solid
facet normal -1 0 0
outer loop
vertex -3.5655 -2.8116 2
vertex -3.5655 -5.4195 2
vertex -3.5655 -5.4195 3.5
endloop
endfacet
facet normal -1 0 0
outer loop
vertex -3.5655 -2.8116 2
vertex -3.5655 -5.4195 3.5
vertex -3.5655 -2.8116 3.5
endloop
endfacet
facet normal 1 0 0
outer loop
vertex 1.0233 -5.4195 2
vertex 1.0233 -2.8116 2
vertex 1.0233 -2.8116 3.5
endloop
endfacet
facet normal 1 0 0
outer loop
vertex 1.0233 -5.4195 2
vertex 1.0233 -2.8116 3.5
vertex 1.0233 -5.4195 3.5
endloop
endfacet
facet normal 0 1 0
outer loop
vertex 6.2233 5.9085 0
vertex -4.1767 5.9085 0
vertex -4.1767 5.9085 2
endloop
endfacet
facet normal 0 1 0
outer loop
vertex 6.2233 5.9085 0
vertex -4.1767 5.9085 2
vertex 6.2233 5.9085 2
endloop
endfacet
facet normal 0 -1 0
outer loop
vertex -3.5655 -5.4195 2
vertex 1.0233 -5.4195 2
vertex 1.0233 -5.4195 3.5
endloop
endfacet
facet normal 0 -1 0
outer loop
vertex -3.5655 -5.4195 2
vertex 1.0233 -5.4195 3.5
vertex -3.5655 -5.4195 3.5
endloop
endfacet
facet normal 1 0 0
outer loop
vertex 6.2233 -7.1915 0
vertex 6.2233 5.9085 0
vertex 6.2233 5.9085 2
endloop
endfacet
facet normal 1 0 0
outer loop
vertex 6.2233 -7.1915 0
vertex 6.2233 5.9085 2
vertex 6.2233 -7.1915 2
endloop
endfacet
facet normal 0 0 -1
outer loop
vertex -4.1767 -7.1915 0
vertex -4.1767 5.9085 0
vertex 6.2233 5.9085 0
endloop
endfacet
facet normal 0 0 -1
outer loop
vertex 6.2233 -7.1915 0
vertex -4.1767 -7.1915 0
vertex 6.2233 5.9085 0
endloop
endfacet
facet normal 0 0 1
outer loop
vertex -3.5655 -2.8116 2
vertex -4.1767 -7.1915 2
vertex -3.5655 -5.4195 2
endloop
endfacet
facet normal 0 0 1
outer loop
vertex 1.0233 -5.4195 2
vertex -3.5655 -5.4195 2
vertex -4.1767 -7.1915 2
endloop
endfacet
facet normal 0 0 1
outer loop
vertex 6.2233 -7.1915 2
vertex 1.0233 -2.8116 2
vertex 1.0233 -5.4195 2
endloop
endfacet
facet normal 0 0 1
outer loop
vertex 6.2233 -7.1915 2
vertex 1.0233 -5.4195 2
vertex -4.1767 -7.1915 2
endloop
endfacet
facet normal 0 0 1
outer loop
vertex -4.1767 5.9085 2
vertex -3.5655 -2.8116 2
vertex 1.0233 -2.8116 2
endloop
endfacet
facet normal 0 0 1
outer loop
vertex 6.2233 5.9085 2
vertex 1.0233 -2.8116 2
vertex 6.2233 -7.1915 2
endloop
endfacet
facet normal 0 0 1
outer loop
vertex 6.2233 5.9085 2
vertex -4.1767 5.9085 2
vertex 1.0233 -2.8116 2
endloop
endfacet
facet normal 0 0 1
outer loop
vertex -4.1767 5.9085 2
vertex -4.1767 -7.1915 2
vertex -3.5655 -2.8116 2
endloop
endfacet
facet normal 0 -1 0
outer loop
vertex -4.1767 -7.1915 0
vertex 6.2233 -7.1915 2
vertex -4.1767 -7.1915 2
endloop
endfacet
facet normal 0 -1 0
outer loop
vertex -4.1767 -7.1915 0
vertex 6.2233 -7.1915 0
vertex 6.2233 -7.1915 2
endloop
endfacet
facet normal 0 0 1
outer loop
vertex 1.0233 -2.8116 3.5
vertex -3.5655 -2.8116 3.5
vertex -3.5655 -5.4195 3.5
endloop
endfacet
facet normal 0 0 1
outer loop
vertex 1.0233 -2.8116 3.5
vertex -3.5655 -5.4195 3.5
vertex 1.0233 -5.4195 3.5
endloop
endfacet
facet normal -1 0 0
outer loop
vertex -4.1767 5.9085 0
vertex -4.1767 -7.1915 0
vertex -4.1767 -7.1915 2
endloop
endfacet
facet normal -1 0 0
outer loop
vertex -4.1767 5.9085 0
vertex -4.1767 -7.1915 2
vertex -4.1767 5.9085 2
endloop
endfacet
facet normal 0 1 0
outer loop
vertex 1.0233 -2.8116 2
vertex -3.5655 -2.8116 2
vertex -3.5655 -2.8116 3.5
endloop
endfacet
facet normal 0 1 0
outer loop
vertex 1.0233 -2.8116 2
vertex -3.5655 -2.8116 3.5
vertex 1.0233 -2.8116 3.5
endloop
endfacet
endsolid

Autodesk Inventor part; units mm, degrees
ref_plane "YZ Plane" through (0, 0, 0) normal (1, 0, 0) x (0, 1, 0)
ref_plane "XZ Plane" through (0, 0, 0) normal (0, 1, 0) x (-1, 0, 0)
ref_plane "XY Plane" through (0, 0, 0) normal (0, 0, 1) x (1, 0, 0)
sketch "Sketch1" plane through (0, 0, 0) normal (0, 0, 1) x (1, 0, 0)
  line L0 (-4.1767, 5.9085) -> (6.2233, 5.9085)
  line L1 (6.2233, 5.9085) -> (6.2233, -7.1915)
  line L2 (6.2233, -7.1915) -> (-4.1767, -7.1915)
  line L3 (-4.1767, -7.1915) -> (-4.1767, 5.9085)
  point P0 (0, 0)
  dimension "d0" = 10.4
  dimension "d1" = 13.1
extrude "Extrusion1" add sketch "Sketch1" along normal blind 2
sketch "Sketch2" plane through (0, 0, 2) normal (0, 0, 1) x (1, 0, 0)
  line L0 (-4.1767, -7.1915) -> (6.2233, -7.1915) projected
  line L1 (6.2233, -7.1915) -> (6.2233, 5.9085) projected
  line L2 (6.2233, 5.9085) -> (-4.1767, 5.9085) projected
  line L3 (-4.1767, 5.9085) -> (-4.1767, -7.1915) projected
  line L4 (6.2233, 5.9085) -> (-4.1767, 5.9085) projected
  line L5 (1.0233, 5.9085) -> (1.0233, -7.1915)
  line L6 (-4.1767, -7.1915) -> (6.2233, -7.1915) projected
  line L7 (6.2233, -7.1915) -> (6.2233, 5.9085) projected
  line L8 (6.2233, -0.6415) -> (-4.1767, -0.6415)
  line L9 (-4.1767, 5.9085) -> (-4.1767, -7.1915) projected
  line L10 (1.0233, -5.4195) -> (-3.5655, -5.4195)
  line L11 (-3.5655, -5.4195) -> (-3.5655, -2.8116)
  line L12 (-3.5655, -2.8116) -> (1.0233, -2.8116)
  line L13 (1.0233, -2.8116) -> (1.0233, -5.4195)
  point P0 (0, 0)
extrude "Extrusion2" add sketch "Sketch2" along normal blind 1.5 contours L10 L11 L12 L5
sketch "Sketch3" plane through (-3.5655, -2.8116, 2) normal (0, 1, 0) x (1, 0, 0)
  line L0 (0, 0) -> (4.5888, 0) projected
  line L1 (0, 0) -> (0, -1.5) projected
  line L2 (4.5888, -1.5) -> (0, -1.5) projected
  line L3 (4.5888, 0) -> (4.5888, -1.5) projected
  line L4 (4.5888, -1.5) -> (0, -1.5) projected
  line L5 (0, 0) -> (0, -1.5) projected
  line L6 (0, -1.5) -> (-10.2377, -47.6792)
  line L7 (4.5888, -1.5) -> (14.8265, -47.6792)
  arc A0 (-10.2377, -47.6792) -> (14.8265, -47.6792) centre (2.2944, 8.8493) ccw
  line L8 (0, -1.5) -> (4.5888, -1.5)
  point P0 (3.5655, 2)
properties part number "tof"
